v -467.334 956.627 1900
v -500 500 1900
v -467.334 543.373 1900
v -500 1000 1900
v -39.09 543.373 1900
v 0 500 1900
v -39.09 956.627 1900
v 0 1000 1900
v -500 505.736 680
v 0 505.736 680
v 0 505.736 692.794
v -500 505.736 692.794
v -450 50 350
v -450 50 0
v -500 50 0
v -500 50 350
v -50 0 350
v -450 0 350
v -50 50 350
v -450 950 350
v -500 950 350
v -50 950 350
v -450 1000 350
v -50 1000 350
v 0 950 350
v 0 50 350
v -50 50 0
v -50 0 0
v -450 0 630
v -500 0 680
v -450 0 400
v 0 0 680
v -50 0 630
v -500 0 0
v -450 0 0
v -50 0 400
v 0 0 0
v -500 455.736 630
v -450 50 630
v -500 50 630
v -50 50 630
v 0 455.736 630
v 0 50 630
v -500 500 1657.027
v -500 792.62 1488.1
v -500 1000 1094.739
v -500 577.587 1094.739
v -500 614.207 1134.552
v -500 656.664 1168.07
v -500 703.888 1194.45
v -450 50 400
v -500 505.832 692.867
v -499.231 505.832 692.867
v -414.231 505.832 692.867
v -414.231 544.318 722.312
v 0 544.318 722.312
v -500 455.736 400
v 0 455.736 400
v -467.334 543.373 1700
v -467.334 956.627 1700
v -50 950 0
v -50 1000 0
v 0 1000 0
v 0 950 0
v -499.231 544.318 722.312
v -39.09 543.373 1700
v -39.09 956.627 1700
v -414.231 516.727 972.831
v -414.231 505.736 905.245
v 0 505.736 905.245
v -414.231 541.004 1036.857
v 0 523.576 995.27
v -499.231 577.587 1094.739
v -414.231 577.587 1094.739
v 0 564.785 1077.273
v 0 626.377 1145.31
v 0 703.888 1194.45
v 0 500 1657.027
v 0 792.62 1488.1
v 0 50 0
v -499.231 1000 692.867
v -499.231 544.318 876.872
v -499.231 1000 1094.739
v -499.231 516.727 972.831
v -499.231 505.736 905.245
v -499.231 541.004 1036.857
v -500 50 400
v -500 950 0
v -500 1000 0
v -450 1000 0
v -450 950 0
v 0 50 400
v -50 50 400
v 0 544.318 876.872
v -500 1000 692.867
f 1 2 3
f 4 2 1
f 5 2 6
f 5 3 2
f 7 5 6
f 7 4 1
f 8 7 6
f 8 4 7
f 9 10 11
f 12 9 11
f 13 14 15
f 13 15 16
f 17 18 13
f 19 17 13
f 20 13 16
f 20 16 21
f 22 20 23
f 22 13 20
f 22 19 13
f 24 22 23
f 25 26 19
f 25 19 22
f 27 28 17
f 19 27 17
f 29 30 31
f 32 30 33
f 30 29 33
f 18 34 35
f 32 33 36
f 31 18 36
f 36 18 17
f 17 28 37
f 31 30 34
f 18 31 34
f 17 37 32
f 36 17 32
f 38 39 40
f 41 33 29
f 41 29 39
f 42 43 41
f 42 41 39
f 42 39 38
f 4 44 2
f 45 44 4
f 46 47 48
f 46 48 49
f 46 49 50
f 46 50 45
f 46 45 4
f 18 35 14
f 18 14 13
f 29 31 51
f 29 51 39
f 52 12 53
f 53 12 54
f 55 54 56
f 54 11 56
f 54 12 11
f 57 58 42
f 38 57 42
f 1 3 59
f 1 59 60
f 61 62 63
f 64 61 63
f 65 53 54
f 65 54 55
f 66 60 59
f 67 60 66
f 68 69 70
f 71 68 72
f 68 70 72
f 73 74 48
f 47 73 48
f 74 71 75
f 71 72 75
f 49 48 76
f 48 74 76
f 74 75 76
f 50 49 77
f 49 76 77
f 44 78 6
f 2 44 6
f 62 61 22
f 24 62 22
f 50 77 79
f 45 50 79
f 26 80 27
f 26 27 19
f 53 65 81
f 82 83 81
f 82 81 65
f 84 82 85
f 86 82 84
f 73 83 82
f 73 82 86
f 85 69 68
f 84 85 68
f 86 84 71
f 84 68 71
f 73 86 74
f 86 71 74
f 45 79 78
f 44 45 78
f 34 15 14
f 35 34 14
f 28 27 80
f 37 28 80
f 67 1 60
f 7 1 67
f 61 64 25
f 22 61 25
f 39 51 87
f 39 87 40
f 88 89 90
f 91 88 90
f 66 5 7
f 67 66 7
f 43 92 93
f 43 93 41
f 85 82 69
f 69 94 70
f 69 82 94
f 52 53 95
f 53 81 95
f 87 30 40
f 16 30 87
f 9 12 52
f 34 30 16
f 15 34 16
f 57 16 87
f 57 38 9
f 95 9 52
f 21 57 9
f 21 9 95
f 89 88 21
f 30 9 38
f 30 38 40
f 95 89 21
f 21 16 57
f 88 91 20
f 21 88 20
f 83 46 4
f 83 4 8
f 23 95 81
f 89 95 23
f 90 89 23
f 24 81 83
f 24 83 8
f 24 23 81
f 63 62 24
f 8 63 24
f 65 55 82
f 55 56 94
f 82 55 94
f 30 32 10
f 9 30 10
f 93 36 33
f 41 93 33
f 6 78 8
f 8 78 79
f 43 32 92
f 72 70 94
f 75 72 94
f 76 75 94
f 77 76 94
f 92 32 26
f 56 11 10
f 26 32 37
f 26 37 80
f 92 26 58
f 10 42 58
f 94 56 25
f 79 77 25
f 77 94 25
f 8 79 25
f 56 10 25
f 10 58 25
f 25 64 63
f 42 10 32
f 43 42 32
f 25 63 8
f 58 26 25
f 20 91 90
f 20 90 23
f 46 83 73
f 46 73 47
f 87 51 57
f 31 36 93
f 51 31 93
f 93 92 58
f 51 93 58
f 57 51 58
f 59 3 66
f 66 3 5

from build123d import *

# Parameters (mm, degrees)
F0_W      = 500
F0_H      = 1000
F1_DEPTH  = 1900
F2_W      = 900
F2_H      = 350
F3_DEPTH  = 500
F4_W      = 400
F4_H      = 350
F5_DEPTH  = 1000
F6_W      = 405.736053
F6_H      = 230
F7_DEPTH  = 500
F8_DEPTH  = 500
F9_W      = 428.243608
F9_H      = 413.254976
F10_DEPTH = 200
F11_W     = 85.769325
F11_H     = 401.872158
F12_DEPTH = 500
F13_W     = 400
F13_H     = 230
F14_DEPTH = 50
F15_DEPTH = 85


with BuildPart() as f1:
    # F0 (on Top) → F1 (new body)
    with BuildSketch(Plane.XY):
        with Locations((-250, 500)):
            Rectangle(F0_W, F0_H)
    extrude(amount=F1_DEPTH)

    # F2 (on face) → F3 (cut)
    with BuildSketch(Plane.YZ):
        with Locations((500, 175)):
            Rectangle(F2_W, F2_H)
    extrude(amount=-F3_DEPTH, mode=Mode.SUBTRACT)

    # F4 (on face) → F5 (cut)
    with BuildSketch(Plane.XZ):
        with Locations((-250, 175)):
            Rectangle(F4_W, F4_H)
    extrude(amount=-F5_DEPTH, mode=Mode.SUBTRACT)

    # F6 (on face) → F7 (cut)
    with BuildSketch(Plane.YZ):
        with Locations((252.868026, 515)):
            Rectangle(F6_W, F6_H)
    extrude(amount=-F7_DEPTH, mode=Mode.SUBTRACT)

    # F6 (on face) → F8 (cut)
    with BuildSketch(Plane.YZ):
        with BuildLine():
            Line((500, 1657.026792), (500, 1900))
            Line((500, 1900), (0, 1900))
            Line((0, 1900), (0, 680))
            Line((0, 680), (50, 680))
            Line((50, 680), (455.736053, 680))
            Line((455.736053, 680), (505.736053, 680))
            Line((505.736053, 680), (505.736053, 692.793548))
            Line((505.736053, 692.793548), (544.31802, 722.311735))
            Line((544.31802, 722.311735), (544.31802, 876.871645))
            Line((544.31802, 876.871645), (505.736053, 905.245364))
            ThreePointArc((505.736053, 905.245364), (564.785088, 1077.27253), (703.88782, 1194.450021))
            Line((703.88782, 1194.450021), (792.619646, 1488.100433))
            Line((792.619646, 1488.100433), (500, 1657.026792))
        make_face()
    extrude(amount=-F8_DEPTH, mode=Mode.SUBTRACT)

    # F9 (on face) → F10 (cut)
    with BuildSketch(Plane.XY.offset(1900)):
        with Locations((-253.211826, 750)):
            Rectangle(F9_W, F9_H)
    extrude(amount=-F10_DEPTH, mode=Mode.SUBTRACT)

    # F11 (on face) → F12 (cut)
    with BuildSketch(Plane(origin=(0, 1000, 0), x_dir=(-1, 0, 0), z_dir=(0, 1, 0))):
        with Locations((457.115338, 893.803358)):
            Rectangle(F11_W, F11_H)
    extrude(amount=-F12_DEPTH, mode=Mode.SUBTRACT)

    # F13 (on face) → F14 (cut)
    with BuildSketch(Plane.XZ):
        with Locations((-250, 515)):
            Rectangle(F13_W, F13_H)
    extrude(amount=-F14_DEPTH, mode=Mode.SUBTRACT)

    # F12_face (on face) → F15 (join)
    with BuildSketch(Plane(origin=(-414.230675, 767.243571, 893.578105), x_dir=(0, -1, 0), z_dir=(-1, 0, 0))):
        with BuildLine():
            Line((-232.756429, 201.161332), (-232.756429, -200.710826))
            Line((-232.756429, -200.710826), (261.411147, -200.710826))
            Line((261.411147, -200.710826), (222.925551, -171.26637))
            Line((222.925551, -171.26637), (222.925551, -16.70646))
            Line((222.925551, -16.70646), (261.507518, 11.667259))
            ThreePointArc((261.507518, 11.667259), (239.989786, 111.877202), (189.656997, 201.161332))
            Line((189.656997, 201.161332), (-232.756429, 201.161332))
        make_face()
    extrude(amount=F15_DEPTH)


solid = f1.part
